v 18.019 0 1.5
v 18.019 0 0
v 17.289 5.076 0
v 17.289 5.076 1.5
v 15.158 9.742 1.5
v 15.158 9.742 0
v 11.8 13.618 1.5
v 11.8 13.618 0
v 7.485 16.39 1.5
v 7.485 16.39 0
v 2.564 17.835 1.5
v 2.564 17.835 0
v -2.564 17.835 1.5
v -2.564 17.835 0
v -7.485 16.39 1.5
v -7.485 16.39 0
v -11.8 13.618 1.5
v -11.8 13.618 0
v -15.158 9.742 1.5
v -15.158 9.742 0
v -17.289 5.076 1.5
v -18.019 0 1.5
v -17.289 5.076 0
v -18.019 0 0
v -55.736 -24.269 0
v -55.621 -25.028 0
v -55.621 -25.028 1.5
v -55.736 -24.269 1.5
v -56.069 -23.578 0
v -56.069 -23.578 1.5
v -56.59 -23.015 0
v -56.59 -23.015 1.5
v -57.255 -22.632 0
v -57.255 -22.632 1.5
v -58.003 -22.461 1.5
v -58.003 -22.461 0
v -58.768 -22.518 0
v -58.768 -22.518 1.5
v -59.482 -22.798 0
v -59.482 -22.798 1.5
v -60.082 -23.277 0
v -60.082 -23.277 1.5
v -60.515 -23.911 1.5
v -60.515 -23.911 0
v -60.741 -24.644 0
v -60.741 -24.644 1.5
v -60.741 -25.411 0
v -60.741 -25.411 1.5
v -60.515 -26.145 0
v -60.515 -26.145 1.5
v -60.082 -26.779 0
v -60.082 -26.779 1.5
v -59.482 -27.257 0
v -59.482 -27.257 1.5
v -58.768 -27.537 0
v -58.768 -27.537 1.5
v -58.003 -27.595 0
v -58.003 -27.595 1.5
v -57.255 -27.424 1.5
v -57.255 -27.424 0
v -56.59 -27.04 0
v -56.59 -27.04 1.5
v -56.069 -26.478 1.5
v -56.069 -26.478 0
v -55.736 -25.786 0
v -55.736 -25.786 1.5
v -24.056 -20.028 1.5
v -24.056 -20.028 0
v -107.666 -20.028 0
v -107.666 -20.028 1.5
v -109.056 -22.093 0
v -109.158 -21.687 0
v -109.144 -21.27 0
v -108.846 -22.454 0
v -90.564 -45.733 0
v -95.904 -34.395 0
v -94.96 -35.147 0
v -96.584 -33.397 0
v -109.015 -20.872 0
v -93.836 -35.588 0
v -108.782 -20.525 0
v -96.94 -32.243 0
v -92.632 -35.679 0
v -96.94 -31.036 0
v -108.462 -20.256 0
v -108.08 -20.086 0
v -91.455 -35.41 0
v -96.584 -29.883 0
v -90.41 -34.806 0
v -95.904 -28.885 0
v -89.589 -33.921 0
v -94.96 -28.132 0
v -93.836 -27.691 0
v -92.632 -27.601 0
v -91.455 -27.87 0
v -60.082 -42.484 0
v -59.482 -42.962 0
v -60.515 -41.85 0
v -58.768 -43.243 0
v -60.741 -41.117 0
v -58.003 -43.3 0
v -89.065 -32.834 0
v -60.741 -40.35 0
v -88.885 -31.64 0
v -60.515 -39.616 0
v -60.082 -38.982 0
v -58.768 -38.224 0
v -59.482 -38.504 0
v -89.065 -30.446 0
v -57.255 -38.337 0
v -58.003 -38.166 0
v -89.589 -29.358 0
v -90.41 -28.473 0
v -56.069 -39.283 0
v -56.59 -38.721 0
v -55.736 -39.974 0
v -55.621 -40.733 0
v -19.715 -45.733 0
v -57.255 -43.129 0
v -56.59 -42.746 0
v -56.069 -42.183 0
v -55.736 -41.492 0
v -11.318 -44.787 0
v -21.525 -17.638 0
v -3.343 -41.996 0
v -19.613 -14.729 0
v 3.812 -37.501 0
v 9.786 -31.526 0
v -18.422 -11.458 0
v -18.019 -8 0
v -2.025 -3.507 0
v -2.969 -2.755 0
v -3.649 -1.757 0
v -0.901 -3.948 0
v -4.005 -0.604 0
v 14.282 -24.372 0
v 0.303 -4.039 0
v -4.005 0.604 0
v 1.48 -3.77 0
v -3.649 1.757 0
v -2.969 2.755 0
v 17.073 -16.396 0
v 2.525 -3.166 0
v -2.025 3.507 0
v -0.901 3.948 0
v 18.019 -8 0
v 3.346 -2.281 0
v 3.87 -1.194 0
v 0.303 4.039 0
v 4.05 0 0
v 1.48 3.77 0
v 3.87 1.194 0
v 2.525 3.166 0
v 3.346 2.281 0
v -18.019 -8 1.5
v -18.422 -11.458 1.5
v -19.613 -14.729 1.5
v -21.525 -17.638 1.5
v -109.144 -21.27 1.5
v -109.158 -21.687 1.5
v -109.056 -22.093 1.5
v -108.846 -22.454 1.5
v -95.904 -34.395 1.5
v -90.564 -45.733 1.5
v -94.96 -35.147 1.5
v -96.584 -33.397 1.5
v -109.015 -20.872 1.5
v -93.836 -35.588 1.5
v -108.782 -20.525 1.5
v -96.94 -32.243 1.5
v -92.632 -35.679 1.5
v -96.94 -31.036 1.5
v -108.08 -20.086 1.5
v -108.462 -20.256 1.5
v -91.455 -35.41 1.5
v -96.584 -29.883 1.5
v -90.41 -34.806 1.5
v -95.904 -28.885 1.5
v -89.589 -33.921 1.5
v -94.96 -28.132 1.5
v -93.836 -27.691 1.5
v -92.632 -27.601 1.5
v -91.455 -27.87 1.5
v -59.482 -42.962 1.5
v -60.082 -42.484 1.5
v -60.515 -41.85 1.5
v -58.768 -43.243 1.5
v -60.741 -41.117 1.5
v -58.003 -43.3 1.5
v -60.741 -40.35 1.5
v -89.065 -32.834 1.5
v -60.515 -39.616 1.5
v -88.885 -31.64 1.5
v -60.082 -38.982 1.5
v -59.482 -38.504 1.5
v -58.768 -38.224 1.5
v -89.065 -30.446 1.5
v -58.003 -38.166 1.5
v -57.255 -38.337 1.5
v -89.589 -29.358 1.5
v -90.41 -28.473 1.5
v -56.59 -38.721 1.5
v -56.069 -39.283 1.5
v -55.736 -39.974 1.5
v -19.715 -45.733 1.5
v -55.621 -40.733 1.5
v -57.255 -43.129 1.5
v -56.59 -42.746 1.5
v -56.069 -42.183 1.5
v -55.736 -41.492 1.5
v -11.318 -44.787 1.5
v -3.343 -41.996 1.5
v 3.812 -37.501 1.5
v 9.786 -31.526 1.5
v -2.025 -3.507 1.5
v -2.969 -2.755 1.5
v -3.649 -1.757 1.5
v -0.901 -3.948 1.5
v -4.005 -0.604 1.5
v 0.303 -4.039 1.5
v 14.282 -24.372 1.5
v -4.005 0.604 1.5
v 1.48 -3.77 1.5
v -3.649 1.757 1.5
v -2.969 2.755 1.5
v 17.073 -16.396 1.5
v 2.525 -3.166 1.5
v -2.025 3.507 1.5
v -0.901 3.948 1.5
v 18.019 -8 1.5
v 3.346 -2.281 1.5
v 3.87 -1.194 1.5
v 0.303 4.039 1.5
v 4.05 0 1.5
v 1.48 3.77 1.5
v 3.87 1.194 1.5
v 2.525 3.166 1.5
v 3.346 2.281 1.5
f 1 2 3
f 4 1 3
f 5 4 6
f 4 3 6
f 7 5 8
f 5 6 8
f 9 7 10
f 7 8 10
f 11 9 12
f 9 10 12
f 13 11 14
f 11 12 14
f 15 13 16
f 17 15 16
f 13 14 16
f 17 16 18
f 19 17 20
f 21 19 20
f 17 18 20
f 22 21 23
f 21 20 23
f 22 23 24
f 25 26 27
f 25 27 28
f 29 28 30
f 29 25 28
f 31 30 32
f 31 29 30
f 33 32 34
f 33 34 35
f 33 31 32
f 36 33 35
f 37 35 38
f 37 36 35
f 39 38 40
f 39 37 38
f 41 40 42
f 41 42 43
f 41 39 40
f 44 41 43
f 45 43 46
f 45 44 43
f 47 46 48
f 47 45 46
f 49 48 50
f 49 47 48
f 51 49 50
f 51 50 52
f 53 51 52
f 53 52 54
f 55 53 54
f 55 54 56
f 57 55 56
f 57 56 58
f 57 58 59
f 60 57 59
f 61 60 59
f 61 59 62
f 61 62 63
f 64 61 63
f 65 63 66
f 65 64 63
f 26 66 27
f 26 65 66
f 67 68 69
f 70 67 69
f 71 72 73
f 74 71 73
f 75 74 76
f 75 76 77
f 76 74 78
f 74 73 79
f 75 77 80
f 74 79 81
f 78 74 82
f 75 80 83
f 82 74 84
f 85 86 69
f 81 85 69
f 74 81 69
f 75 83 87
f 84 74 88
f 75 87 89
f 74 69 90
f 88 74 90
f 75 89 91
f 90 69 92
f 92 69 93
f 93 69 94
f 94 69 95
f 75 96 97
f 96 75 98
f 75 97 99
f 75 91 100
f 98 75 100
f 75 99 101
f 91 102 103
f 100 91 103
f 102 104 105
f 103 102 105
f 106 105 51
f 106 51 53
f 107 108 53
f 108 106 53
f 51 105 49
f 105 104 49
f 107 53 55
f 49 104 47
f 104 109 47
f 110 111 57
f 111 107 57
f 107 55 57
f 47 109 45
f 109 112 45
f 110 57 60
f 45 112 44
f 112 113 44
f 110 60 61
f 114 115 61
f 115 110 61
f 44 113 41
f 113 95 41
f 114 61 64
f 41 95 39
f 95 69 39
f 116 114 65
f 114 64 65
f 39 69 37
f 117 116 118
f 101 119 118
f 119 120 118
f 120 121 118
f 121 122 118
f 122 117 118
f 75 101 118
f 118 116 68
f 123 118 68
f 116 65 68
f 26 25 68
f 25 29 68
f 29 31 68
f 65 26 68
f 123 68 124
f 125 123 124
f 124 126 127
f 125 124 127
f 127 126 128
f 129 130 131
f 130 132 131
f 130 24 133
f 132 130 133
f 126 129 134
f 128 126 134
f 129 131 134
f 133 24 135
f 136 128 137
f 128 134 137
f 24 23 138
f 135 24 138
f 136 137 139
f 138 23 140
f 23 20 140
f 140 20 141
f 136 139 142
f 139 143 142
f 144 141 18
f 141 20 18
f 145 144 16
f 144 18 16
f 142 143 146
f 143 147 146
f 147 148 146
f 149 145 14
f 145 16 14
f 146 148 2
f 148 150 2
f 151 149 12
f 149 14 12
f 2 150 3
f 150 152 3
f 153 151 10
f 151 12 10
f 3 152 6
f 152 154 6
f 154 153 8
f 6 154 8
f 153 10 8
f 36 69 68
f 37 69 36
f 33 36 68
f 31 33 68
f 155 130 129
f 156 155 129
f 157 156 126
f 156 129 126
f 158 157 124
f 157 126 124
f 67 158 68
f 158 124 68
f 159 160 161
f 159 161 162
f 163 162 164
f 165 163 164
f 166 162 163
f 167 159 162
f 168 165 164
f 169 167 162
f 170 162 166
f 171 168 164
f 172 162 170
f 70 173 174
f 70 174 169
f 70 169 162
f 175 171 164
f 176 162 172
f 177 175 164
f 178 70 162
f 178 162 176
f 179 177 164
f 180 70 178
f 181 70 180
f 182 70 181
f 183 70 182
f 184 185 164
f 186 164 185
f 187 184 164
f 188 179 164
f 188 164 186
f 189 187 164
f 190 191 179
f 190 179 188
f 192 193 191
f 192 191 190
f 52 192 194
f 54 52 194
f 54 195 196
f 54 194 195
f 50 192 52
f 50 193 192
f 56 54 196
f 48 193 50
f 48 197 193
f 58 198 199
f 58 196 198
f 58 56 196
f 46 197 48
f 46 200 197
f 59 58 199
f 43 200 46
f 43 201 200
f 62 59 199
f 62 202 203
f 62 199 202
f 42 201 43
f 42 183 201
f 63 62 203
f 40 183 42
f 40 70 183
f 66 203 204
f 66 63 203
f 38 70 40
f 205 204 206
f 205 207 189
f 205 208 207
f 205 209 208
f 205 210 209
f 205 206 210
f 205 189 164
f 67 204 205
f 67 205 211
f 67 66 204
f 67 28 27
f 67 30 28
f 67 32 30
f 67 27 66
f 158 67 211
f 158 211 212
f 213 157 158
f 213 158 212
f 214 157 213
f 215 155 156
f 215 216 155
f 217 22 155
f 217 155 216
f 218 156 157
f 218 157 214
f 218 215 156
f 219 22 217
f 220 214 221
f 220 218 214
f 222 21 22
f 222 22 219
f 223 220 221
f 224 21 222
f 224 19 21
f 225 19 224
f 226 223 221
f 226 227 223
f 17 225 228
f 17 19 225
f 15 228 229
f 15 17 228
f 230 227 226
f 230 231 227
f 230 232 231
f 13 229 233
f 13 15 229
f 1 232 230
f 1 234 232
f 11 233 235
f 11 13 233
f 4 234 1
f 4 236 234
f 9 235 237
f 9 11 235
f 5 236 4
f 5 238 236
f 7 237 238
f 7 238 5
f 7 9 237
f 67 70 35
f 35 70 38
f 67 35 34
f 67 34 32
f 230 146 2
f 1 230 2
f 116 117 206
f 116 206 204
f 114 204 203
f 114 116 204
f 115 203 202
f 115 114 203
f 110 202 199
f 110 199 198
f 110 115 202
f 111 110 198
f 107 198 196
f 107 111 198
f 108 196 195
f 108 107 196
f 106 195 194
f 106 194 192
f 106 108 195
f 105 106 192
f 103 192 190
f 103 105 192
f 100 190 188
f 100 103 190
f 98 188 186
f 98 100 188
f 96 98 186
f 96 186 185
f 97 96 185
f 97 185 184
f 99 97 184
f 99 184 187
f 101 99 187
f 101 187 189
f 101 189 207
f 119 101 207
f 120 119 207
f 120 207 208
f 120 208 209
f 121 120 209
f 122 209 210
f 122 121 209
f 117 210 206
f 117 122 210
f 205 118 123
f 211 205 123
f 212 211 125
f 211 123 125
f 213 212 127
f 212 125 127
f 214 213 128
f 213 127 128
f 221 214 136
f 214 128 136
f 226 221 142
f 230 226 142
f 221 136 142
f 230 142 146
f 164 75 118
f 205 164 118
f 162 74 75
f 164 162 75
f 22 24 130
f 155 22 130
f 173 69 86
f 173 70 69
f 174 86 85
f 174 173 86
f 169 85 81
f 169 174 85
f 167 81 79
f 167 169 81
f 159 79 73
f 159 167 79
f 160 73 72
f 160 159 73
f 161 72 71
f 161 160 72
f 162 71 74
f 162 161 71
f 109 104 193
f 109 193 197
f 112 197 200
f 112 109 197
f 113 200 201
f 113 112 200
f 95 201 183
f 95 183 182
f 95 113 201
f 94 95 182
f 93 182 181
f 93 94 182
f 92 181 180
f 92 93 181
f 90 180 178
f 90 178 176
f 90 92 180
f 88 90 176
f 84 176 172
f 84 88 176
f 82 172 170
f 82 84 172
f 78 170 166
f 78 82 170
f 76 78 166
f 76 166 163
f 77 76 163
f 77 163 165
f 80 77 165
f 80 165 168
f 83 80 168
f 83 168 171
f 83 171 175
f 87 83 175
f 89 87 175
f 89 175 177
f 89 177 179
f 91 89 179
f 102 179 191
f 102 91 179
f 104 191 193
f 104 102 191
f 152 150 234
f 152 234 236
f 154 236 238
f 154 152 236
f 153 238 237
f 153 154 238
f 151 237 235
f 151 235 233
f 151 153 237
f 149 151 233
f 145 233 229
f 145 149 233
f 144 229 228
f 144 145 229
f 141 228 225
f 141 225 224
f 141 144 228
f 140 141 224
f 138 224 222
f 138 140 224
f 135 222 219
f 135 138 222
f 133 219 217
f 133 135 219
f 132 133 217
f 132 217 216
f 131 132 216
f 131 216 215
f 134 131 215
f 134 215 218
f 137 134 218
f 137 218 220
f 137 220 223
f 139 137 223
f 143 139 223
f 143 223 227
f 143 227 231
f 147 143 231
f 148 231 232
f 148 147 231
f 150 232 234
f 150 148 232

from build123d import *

# Parameters (mm, degrees)
ESBO_O1_R                = 4.05
ESBO_O1_R_2              = 2.574080602
RESSALTO_EXTRUS_O1_DEPTH = 1.5
FILETE1_R                = 1.5


with BuildPart() as part:
    # Esboço1 → Ressalto-extrusão1 (new body)
    with BuildSketch(Plane.XY):
        with BuildLine():
            Line((-18.018564211, 0), (-18.018564211, -8))
            ThreePointArc((-18.018564211, -8), (-19.612515049, -14.728881473), (-24.055610328, -20.027695444))
            Line((-24.055610328, -20.027695444), (-110.751402368, -20.027695444))
            Line((-110.751402368, -20.027695444), (-90.563626469, -45.733186479))
            Line((-90.563626469, -45.733186479), (-19.714622268, -45.733186479))
            ThreePointArc((-19.714622268, -45.733186479), (6.966769767, -34.681392035), (18.018564211, -8))
            Line((18.018564211, -8), (18.018564211, 0))
            ThreePointArc((18.018564211, 0), (0, 18.018564211), (-18.018564211, 0))
        make_face()
        Circle(ESBO_O1_R, mode=Mode.SUBTRACT)
        with Locations((-58.195334888, -25.027695444)):
            Circle(ESBO_O1_R_2, mode=Mode.SUBTRACT)
        with Locations((-58.195334888, -40.733186479)):
            Circle(ESBO_O1_R_2, mode=Mode.SUBTRACT)
        with Locations((-92.935045512, -31.639829044)):
            Circle(ESBO_O1_R, mode=Mode.SUBTRACT)
    extrude(amount=RESSALTO_EXTRUS_O1_DEPTH)

    # Filete1
    filete1_edges = [part.edges().sort_by_distance(p)[0] for p in [
        (-110.751402368, -20.027695444, 0.75),
    ]]
    fillet(filete1_edges, radius=FILETE1_R)


solid = part.part
